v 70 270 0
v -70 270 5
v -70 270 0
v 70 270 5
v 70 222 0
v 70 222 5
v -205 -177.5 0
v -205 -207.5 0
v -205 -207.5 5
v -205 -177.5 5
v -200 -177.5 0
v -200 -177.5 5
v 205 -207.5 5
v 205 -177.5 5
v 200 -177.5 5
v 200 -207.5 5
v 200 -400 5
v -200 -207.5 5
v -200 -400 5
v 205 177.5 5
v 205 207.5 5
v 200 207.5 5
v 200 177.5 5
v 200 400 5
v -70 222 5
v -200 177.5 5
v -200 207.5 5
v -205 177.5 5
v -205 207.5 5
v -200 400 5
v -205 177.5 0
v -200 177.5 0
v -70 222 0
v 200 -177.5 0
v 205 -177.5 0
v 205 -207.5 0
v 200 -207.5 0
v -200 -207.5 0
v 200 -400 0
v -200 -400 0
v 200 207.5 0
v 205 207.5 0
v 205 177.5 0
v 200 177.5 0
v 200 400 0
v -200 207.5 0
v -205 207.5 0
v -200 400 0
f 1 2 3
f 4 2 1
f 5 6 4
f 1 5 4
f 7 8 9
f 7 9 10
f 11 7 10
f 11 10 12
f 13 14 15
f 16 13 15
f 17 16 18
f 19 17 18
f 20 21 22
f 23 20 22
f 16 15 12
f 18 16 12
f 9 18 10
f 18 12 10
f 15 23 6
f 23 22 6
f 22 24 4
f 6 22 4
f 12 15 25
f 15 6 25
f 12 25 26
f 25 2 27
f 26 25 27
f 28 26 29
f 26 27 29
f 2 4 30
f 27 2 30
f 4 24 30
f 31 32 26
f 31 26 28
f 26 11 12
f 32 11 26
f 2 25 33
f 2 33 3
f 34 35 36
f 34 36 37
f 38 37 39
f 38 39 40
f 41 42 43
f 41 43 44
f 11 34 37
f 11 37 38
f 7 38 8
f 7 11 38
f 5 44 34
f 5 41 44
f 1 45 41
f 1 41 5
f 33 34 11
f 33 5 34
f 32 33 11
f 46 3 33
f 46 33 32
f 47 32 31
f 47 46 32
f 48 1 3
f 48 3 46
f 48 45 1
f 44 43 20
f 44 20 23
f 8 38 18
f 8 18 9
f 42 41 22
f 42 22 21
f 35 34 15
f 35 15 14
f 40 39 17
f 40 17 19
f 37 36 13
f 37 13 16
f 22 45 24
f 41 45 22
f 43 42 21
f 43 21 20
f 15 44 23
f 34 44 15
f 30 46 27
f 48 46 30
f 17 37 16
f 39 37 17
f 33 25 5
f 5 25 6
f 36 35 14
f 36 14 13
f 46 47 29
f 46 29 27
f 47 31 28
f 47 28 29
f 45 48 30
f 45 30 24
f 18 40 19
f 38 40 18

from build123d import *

# Parameters (mm, degrees)
BOSS_EXTRU_1_DEPTH      = 5
ESQUISSE2_W             = 140
ESQUISSE2_H             = 48
ENL_V_MAT_EXTRU_1_DEPTH = 450.499721913


with BuildPart() as part:
    # Esquisse1 → Boss.-Extru.1 (new body)
    with BuildSketch(Plane.XY):
        Polygon((-200, 400), (200, 400), (200, 207.5), (205, 207.5), (205, 177.5), (200, 177.5), (200, -177.5), (205, -177.5), (205, -207.5), (200, -207.5), (200, -400), (-200, -400), (-200, -207.5), (-205, -207.5), (-205, -177.5), (-200, -177.5), (-200, 177.5), (-205, 177.5), (-205, 207.5), (-200, 207.5), align=None)
    extrude(amount=BOSS_EXTRU_1_DEPTH)

    # Esquisse2 → Enlèv. mat.-Extru.1 (cut, through all)
    with BuildSketch(Plane.XY.offset(5)):
        with Locations((0, 246)):
            Rectangle(ESQUISSE2_W, ESQUISSE2_H)
    extrude(amount=-ENL_V_MAT_EXTRU_1_DEPTH, mode=Mode.SUBTRACT)


solid = part.part
